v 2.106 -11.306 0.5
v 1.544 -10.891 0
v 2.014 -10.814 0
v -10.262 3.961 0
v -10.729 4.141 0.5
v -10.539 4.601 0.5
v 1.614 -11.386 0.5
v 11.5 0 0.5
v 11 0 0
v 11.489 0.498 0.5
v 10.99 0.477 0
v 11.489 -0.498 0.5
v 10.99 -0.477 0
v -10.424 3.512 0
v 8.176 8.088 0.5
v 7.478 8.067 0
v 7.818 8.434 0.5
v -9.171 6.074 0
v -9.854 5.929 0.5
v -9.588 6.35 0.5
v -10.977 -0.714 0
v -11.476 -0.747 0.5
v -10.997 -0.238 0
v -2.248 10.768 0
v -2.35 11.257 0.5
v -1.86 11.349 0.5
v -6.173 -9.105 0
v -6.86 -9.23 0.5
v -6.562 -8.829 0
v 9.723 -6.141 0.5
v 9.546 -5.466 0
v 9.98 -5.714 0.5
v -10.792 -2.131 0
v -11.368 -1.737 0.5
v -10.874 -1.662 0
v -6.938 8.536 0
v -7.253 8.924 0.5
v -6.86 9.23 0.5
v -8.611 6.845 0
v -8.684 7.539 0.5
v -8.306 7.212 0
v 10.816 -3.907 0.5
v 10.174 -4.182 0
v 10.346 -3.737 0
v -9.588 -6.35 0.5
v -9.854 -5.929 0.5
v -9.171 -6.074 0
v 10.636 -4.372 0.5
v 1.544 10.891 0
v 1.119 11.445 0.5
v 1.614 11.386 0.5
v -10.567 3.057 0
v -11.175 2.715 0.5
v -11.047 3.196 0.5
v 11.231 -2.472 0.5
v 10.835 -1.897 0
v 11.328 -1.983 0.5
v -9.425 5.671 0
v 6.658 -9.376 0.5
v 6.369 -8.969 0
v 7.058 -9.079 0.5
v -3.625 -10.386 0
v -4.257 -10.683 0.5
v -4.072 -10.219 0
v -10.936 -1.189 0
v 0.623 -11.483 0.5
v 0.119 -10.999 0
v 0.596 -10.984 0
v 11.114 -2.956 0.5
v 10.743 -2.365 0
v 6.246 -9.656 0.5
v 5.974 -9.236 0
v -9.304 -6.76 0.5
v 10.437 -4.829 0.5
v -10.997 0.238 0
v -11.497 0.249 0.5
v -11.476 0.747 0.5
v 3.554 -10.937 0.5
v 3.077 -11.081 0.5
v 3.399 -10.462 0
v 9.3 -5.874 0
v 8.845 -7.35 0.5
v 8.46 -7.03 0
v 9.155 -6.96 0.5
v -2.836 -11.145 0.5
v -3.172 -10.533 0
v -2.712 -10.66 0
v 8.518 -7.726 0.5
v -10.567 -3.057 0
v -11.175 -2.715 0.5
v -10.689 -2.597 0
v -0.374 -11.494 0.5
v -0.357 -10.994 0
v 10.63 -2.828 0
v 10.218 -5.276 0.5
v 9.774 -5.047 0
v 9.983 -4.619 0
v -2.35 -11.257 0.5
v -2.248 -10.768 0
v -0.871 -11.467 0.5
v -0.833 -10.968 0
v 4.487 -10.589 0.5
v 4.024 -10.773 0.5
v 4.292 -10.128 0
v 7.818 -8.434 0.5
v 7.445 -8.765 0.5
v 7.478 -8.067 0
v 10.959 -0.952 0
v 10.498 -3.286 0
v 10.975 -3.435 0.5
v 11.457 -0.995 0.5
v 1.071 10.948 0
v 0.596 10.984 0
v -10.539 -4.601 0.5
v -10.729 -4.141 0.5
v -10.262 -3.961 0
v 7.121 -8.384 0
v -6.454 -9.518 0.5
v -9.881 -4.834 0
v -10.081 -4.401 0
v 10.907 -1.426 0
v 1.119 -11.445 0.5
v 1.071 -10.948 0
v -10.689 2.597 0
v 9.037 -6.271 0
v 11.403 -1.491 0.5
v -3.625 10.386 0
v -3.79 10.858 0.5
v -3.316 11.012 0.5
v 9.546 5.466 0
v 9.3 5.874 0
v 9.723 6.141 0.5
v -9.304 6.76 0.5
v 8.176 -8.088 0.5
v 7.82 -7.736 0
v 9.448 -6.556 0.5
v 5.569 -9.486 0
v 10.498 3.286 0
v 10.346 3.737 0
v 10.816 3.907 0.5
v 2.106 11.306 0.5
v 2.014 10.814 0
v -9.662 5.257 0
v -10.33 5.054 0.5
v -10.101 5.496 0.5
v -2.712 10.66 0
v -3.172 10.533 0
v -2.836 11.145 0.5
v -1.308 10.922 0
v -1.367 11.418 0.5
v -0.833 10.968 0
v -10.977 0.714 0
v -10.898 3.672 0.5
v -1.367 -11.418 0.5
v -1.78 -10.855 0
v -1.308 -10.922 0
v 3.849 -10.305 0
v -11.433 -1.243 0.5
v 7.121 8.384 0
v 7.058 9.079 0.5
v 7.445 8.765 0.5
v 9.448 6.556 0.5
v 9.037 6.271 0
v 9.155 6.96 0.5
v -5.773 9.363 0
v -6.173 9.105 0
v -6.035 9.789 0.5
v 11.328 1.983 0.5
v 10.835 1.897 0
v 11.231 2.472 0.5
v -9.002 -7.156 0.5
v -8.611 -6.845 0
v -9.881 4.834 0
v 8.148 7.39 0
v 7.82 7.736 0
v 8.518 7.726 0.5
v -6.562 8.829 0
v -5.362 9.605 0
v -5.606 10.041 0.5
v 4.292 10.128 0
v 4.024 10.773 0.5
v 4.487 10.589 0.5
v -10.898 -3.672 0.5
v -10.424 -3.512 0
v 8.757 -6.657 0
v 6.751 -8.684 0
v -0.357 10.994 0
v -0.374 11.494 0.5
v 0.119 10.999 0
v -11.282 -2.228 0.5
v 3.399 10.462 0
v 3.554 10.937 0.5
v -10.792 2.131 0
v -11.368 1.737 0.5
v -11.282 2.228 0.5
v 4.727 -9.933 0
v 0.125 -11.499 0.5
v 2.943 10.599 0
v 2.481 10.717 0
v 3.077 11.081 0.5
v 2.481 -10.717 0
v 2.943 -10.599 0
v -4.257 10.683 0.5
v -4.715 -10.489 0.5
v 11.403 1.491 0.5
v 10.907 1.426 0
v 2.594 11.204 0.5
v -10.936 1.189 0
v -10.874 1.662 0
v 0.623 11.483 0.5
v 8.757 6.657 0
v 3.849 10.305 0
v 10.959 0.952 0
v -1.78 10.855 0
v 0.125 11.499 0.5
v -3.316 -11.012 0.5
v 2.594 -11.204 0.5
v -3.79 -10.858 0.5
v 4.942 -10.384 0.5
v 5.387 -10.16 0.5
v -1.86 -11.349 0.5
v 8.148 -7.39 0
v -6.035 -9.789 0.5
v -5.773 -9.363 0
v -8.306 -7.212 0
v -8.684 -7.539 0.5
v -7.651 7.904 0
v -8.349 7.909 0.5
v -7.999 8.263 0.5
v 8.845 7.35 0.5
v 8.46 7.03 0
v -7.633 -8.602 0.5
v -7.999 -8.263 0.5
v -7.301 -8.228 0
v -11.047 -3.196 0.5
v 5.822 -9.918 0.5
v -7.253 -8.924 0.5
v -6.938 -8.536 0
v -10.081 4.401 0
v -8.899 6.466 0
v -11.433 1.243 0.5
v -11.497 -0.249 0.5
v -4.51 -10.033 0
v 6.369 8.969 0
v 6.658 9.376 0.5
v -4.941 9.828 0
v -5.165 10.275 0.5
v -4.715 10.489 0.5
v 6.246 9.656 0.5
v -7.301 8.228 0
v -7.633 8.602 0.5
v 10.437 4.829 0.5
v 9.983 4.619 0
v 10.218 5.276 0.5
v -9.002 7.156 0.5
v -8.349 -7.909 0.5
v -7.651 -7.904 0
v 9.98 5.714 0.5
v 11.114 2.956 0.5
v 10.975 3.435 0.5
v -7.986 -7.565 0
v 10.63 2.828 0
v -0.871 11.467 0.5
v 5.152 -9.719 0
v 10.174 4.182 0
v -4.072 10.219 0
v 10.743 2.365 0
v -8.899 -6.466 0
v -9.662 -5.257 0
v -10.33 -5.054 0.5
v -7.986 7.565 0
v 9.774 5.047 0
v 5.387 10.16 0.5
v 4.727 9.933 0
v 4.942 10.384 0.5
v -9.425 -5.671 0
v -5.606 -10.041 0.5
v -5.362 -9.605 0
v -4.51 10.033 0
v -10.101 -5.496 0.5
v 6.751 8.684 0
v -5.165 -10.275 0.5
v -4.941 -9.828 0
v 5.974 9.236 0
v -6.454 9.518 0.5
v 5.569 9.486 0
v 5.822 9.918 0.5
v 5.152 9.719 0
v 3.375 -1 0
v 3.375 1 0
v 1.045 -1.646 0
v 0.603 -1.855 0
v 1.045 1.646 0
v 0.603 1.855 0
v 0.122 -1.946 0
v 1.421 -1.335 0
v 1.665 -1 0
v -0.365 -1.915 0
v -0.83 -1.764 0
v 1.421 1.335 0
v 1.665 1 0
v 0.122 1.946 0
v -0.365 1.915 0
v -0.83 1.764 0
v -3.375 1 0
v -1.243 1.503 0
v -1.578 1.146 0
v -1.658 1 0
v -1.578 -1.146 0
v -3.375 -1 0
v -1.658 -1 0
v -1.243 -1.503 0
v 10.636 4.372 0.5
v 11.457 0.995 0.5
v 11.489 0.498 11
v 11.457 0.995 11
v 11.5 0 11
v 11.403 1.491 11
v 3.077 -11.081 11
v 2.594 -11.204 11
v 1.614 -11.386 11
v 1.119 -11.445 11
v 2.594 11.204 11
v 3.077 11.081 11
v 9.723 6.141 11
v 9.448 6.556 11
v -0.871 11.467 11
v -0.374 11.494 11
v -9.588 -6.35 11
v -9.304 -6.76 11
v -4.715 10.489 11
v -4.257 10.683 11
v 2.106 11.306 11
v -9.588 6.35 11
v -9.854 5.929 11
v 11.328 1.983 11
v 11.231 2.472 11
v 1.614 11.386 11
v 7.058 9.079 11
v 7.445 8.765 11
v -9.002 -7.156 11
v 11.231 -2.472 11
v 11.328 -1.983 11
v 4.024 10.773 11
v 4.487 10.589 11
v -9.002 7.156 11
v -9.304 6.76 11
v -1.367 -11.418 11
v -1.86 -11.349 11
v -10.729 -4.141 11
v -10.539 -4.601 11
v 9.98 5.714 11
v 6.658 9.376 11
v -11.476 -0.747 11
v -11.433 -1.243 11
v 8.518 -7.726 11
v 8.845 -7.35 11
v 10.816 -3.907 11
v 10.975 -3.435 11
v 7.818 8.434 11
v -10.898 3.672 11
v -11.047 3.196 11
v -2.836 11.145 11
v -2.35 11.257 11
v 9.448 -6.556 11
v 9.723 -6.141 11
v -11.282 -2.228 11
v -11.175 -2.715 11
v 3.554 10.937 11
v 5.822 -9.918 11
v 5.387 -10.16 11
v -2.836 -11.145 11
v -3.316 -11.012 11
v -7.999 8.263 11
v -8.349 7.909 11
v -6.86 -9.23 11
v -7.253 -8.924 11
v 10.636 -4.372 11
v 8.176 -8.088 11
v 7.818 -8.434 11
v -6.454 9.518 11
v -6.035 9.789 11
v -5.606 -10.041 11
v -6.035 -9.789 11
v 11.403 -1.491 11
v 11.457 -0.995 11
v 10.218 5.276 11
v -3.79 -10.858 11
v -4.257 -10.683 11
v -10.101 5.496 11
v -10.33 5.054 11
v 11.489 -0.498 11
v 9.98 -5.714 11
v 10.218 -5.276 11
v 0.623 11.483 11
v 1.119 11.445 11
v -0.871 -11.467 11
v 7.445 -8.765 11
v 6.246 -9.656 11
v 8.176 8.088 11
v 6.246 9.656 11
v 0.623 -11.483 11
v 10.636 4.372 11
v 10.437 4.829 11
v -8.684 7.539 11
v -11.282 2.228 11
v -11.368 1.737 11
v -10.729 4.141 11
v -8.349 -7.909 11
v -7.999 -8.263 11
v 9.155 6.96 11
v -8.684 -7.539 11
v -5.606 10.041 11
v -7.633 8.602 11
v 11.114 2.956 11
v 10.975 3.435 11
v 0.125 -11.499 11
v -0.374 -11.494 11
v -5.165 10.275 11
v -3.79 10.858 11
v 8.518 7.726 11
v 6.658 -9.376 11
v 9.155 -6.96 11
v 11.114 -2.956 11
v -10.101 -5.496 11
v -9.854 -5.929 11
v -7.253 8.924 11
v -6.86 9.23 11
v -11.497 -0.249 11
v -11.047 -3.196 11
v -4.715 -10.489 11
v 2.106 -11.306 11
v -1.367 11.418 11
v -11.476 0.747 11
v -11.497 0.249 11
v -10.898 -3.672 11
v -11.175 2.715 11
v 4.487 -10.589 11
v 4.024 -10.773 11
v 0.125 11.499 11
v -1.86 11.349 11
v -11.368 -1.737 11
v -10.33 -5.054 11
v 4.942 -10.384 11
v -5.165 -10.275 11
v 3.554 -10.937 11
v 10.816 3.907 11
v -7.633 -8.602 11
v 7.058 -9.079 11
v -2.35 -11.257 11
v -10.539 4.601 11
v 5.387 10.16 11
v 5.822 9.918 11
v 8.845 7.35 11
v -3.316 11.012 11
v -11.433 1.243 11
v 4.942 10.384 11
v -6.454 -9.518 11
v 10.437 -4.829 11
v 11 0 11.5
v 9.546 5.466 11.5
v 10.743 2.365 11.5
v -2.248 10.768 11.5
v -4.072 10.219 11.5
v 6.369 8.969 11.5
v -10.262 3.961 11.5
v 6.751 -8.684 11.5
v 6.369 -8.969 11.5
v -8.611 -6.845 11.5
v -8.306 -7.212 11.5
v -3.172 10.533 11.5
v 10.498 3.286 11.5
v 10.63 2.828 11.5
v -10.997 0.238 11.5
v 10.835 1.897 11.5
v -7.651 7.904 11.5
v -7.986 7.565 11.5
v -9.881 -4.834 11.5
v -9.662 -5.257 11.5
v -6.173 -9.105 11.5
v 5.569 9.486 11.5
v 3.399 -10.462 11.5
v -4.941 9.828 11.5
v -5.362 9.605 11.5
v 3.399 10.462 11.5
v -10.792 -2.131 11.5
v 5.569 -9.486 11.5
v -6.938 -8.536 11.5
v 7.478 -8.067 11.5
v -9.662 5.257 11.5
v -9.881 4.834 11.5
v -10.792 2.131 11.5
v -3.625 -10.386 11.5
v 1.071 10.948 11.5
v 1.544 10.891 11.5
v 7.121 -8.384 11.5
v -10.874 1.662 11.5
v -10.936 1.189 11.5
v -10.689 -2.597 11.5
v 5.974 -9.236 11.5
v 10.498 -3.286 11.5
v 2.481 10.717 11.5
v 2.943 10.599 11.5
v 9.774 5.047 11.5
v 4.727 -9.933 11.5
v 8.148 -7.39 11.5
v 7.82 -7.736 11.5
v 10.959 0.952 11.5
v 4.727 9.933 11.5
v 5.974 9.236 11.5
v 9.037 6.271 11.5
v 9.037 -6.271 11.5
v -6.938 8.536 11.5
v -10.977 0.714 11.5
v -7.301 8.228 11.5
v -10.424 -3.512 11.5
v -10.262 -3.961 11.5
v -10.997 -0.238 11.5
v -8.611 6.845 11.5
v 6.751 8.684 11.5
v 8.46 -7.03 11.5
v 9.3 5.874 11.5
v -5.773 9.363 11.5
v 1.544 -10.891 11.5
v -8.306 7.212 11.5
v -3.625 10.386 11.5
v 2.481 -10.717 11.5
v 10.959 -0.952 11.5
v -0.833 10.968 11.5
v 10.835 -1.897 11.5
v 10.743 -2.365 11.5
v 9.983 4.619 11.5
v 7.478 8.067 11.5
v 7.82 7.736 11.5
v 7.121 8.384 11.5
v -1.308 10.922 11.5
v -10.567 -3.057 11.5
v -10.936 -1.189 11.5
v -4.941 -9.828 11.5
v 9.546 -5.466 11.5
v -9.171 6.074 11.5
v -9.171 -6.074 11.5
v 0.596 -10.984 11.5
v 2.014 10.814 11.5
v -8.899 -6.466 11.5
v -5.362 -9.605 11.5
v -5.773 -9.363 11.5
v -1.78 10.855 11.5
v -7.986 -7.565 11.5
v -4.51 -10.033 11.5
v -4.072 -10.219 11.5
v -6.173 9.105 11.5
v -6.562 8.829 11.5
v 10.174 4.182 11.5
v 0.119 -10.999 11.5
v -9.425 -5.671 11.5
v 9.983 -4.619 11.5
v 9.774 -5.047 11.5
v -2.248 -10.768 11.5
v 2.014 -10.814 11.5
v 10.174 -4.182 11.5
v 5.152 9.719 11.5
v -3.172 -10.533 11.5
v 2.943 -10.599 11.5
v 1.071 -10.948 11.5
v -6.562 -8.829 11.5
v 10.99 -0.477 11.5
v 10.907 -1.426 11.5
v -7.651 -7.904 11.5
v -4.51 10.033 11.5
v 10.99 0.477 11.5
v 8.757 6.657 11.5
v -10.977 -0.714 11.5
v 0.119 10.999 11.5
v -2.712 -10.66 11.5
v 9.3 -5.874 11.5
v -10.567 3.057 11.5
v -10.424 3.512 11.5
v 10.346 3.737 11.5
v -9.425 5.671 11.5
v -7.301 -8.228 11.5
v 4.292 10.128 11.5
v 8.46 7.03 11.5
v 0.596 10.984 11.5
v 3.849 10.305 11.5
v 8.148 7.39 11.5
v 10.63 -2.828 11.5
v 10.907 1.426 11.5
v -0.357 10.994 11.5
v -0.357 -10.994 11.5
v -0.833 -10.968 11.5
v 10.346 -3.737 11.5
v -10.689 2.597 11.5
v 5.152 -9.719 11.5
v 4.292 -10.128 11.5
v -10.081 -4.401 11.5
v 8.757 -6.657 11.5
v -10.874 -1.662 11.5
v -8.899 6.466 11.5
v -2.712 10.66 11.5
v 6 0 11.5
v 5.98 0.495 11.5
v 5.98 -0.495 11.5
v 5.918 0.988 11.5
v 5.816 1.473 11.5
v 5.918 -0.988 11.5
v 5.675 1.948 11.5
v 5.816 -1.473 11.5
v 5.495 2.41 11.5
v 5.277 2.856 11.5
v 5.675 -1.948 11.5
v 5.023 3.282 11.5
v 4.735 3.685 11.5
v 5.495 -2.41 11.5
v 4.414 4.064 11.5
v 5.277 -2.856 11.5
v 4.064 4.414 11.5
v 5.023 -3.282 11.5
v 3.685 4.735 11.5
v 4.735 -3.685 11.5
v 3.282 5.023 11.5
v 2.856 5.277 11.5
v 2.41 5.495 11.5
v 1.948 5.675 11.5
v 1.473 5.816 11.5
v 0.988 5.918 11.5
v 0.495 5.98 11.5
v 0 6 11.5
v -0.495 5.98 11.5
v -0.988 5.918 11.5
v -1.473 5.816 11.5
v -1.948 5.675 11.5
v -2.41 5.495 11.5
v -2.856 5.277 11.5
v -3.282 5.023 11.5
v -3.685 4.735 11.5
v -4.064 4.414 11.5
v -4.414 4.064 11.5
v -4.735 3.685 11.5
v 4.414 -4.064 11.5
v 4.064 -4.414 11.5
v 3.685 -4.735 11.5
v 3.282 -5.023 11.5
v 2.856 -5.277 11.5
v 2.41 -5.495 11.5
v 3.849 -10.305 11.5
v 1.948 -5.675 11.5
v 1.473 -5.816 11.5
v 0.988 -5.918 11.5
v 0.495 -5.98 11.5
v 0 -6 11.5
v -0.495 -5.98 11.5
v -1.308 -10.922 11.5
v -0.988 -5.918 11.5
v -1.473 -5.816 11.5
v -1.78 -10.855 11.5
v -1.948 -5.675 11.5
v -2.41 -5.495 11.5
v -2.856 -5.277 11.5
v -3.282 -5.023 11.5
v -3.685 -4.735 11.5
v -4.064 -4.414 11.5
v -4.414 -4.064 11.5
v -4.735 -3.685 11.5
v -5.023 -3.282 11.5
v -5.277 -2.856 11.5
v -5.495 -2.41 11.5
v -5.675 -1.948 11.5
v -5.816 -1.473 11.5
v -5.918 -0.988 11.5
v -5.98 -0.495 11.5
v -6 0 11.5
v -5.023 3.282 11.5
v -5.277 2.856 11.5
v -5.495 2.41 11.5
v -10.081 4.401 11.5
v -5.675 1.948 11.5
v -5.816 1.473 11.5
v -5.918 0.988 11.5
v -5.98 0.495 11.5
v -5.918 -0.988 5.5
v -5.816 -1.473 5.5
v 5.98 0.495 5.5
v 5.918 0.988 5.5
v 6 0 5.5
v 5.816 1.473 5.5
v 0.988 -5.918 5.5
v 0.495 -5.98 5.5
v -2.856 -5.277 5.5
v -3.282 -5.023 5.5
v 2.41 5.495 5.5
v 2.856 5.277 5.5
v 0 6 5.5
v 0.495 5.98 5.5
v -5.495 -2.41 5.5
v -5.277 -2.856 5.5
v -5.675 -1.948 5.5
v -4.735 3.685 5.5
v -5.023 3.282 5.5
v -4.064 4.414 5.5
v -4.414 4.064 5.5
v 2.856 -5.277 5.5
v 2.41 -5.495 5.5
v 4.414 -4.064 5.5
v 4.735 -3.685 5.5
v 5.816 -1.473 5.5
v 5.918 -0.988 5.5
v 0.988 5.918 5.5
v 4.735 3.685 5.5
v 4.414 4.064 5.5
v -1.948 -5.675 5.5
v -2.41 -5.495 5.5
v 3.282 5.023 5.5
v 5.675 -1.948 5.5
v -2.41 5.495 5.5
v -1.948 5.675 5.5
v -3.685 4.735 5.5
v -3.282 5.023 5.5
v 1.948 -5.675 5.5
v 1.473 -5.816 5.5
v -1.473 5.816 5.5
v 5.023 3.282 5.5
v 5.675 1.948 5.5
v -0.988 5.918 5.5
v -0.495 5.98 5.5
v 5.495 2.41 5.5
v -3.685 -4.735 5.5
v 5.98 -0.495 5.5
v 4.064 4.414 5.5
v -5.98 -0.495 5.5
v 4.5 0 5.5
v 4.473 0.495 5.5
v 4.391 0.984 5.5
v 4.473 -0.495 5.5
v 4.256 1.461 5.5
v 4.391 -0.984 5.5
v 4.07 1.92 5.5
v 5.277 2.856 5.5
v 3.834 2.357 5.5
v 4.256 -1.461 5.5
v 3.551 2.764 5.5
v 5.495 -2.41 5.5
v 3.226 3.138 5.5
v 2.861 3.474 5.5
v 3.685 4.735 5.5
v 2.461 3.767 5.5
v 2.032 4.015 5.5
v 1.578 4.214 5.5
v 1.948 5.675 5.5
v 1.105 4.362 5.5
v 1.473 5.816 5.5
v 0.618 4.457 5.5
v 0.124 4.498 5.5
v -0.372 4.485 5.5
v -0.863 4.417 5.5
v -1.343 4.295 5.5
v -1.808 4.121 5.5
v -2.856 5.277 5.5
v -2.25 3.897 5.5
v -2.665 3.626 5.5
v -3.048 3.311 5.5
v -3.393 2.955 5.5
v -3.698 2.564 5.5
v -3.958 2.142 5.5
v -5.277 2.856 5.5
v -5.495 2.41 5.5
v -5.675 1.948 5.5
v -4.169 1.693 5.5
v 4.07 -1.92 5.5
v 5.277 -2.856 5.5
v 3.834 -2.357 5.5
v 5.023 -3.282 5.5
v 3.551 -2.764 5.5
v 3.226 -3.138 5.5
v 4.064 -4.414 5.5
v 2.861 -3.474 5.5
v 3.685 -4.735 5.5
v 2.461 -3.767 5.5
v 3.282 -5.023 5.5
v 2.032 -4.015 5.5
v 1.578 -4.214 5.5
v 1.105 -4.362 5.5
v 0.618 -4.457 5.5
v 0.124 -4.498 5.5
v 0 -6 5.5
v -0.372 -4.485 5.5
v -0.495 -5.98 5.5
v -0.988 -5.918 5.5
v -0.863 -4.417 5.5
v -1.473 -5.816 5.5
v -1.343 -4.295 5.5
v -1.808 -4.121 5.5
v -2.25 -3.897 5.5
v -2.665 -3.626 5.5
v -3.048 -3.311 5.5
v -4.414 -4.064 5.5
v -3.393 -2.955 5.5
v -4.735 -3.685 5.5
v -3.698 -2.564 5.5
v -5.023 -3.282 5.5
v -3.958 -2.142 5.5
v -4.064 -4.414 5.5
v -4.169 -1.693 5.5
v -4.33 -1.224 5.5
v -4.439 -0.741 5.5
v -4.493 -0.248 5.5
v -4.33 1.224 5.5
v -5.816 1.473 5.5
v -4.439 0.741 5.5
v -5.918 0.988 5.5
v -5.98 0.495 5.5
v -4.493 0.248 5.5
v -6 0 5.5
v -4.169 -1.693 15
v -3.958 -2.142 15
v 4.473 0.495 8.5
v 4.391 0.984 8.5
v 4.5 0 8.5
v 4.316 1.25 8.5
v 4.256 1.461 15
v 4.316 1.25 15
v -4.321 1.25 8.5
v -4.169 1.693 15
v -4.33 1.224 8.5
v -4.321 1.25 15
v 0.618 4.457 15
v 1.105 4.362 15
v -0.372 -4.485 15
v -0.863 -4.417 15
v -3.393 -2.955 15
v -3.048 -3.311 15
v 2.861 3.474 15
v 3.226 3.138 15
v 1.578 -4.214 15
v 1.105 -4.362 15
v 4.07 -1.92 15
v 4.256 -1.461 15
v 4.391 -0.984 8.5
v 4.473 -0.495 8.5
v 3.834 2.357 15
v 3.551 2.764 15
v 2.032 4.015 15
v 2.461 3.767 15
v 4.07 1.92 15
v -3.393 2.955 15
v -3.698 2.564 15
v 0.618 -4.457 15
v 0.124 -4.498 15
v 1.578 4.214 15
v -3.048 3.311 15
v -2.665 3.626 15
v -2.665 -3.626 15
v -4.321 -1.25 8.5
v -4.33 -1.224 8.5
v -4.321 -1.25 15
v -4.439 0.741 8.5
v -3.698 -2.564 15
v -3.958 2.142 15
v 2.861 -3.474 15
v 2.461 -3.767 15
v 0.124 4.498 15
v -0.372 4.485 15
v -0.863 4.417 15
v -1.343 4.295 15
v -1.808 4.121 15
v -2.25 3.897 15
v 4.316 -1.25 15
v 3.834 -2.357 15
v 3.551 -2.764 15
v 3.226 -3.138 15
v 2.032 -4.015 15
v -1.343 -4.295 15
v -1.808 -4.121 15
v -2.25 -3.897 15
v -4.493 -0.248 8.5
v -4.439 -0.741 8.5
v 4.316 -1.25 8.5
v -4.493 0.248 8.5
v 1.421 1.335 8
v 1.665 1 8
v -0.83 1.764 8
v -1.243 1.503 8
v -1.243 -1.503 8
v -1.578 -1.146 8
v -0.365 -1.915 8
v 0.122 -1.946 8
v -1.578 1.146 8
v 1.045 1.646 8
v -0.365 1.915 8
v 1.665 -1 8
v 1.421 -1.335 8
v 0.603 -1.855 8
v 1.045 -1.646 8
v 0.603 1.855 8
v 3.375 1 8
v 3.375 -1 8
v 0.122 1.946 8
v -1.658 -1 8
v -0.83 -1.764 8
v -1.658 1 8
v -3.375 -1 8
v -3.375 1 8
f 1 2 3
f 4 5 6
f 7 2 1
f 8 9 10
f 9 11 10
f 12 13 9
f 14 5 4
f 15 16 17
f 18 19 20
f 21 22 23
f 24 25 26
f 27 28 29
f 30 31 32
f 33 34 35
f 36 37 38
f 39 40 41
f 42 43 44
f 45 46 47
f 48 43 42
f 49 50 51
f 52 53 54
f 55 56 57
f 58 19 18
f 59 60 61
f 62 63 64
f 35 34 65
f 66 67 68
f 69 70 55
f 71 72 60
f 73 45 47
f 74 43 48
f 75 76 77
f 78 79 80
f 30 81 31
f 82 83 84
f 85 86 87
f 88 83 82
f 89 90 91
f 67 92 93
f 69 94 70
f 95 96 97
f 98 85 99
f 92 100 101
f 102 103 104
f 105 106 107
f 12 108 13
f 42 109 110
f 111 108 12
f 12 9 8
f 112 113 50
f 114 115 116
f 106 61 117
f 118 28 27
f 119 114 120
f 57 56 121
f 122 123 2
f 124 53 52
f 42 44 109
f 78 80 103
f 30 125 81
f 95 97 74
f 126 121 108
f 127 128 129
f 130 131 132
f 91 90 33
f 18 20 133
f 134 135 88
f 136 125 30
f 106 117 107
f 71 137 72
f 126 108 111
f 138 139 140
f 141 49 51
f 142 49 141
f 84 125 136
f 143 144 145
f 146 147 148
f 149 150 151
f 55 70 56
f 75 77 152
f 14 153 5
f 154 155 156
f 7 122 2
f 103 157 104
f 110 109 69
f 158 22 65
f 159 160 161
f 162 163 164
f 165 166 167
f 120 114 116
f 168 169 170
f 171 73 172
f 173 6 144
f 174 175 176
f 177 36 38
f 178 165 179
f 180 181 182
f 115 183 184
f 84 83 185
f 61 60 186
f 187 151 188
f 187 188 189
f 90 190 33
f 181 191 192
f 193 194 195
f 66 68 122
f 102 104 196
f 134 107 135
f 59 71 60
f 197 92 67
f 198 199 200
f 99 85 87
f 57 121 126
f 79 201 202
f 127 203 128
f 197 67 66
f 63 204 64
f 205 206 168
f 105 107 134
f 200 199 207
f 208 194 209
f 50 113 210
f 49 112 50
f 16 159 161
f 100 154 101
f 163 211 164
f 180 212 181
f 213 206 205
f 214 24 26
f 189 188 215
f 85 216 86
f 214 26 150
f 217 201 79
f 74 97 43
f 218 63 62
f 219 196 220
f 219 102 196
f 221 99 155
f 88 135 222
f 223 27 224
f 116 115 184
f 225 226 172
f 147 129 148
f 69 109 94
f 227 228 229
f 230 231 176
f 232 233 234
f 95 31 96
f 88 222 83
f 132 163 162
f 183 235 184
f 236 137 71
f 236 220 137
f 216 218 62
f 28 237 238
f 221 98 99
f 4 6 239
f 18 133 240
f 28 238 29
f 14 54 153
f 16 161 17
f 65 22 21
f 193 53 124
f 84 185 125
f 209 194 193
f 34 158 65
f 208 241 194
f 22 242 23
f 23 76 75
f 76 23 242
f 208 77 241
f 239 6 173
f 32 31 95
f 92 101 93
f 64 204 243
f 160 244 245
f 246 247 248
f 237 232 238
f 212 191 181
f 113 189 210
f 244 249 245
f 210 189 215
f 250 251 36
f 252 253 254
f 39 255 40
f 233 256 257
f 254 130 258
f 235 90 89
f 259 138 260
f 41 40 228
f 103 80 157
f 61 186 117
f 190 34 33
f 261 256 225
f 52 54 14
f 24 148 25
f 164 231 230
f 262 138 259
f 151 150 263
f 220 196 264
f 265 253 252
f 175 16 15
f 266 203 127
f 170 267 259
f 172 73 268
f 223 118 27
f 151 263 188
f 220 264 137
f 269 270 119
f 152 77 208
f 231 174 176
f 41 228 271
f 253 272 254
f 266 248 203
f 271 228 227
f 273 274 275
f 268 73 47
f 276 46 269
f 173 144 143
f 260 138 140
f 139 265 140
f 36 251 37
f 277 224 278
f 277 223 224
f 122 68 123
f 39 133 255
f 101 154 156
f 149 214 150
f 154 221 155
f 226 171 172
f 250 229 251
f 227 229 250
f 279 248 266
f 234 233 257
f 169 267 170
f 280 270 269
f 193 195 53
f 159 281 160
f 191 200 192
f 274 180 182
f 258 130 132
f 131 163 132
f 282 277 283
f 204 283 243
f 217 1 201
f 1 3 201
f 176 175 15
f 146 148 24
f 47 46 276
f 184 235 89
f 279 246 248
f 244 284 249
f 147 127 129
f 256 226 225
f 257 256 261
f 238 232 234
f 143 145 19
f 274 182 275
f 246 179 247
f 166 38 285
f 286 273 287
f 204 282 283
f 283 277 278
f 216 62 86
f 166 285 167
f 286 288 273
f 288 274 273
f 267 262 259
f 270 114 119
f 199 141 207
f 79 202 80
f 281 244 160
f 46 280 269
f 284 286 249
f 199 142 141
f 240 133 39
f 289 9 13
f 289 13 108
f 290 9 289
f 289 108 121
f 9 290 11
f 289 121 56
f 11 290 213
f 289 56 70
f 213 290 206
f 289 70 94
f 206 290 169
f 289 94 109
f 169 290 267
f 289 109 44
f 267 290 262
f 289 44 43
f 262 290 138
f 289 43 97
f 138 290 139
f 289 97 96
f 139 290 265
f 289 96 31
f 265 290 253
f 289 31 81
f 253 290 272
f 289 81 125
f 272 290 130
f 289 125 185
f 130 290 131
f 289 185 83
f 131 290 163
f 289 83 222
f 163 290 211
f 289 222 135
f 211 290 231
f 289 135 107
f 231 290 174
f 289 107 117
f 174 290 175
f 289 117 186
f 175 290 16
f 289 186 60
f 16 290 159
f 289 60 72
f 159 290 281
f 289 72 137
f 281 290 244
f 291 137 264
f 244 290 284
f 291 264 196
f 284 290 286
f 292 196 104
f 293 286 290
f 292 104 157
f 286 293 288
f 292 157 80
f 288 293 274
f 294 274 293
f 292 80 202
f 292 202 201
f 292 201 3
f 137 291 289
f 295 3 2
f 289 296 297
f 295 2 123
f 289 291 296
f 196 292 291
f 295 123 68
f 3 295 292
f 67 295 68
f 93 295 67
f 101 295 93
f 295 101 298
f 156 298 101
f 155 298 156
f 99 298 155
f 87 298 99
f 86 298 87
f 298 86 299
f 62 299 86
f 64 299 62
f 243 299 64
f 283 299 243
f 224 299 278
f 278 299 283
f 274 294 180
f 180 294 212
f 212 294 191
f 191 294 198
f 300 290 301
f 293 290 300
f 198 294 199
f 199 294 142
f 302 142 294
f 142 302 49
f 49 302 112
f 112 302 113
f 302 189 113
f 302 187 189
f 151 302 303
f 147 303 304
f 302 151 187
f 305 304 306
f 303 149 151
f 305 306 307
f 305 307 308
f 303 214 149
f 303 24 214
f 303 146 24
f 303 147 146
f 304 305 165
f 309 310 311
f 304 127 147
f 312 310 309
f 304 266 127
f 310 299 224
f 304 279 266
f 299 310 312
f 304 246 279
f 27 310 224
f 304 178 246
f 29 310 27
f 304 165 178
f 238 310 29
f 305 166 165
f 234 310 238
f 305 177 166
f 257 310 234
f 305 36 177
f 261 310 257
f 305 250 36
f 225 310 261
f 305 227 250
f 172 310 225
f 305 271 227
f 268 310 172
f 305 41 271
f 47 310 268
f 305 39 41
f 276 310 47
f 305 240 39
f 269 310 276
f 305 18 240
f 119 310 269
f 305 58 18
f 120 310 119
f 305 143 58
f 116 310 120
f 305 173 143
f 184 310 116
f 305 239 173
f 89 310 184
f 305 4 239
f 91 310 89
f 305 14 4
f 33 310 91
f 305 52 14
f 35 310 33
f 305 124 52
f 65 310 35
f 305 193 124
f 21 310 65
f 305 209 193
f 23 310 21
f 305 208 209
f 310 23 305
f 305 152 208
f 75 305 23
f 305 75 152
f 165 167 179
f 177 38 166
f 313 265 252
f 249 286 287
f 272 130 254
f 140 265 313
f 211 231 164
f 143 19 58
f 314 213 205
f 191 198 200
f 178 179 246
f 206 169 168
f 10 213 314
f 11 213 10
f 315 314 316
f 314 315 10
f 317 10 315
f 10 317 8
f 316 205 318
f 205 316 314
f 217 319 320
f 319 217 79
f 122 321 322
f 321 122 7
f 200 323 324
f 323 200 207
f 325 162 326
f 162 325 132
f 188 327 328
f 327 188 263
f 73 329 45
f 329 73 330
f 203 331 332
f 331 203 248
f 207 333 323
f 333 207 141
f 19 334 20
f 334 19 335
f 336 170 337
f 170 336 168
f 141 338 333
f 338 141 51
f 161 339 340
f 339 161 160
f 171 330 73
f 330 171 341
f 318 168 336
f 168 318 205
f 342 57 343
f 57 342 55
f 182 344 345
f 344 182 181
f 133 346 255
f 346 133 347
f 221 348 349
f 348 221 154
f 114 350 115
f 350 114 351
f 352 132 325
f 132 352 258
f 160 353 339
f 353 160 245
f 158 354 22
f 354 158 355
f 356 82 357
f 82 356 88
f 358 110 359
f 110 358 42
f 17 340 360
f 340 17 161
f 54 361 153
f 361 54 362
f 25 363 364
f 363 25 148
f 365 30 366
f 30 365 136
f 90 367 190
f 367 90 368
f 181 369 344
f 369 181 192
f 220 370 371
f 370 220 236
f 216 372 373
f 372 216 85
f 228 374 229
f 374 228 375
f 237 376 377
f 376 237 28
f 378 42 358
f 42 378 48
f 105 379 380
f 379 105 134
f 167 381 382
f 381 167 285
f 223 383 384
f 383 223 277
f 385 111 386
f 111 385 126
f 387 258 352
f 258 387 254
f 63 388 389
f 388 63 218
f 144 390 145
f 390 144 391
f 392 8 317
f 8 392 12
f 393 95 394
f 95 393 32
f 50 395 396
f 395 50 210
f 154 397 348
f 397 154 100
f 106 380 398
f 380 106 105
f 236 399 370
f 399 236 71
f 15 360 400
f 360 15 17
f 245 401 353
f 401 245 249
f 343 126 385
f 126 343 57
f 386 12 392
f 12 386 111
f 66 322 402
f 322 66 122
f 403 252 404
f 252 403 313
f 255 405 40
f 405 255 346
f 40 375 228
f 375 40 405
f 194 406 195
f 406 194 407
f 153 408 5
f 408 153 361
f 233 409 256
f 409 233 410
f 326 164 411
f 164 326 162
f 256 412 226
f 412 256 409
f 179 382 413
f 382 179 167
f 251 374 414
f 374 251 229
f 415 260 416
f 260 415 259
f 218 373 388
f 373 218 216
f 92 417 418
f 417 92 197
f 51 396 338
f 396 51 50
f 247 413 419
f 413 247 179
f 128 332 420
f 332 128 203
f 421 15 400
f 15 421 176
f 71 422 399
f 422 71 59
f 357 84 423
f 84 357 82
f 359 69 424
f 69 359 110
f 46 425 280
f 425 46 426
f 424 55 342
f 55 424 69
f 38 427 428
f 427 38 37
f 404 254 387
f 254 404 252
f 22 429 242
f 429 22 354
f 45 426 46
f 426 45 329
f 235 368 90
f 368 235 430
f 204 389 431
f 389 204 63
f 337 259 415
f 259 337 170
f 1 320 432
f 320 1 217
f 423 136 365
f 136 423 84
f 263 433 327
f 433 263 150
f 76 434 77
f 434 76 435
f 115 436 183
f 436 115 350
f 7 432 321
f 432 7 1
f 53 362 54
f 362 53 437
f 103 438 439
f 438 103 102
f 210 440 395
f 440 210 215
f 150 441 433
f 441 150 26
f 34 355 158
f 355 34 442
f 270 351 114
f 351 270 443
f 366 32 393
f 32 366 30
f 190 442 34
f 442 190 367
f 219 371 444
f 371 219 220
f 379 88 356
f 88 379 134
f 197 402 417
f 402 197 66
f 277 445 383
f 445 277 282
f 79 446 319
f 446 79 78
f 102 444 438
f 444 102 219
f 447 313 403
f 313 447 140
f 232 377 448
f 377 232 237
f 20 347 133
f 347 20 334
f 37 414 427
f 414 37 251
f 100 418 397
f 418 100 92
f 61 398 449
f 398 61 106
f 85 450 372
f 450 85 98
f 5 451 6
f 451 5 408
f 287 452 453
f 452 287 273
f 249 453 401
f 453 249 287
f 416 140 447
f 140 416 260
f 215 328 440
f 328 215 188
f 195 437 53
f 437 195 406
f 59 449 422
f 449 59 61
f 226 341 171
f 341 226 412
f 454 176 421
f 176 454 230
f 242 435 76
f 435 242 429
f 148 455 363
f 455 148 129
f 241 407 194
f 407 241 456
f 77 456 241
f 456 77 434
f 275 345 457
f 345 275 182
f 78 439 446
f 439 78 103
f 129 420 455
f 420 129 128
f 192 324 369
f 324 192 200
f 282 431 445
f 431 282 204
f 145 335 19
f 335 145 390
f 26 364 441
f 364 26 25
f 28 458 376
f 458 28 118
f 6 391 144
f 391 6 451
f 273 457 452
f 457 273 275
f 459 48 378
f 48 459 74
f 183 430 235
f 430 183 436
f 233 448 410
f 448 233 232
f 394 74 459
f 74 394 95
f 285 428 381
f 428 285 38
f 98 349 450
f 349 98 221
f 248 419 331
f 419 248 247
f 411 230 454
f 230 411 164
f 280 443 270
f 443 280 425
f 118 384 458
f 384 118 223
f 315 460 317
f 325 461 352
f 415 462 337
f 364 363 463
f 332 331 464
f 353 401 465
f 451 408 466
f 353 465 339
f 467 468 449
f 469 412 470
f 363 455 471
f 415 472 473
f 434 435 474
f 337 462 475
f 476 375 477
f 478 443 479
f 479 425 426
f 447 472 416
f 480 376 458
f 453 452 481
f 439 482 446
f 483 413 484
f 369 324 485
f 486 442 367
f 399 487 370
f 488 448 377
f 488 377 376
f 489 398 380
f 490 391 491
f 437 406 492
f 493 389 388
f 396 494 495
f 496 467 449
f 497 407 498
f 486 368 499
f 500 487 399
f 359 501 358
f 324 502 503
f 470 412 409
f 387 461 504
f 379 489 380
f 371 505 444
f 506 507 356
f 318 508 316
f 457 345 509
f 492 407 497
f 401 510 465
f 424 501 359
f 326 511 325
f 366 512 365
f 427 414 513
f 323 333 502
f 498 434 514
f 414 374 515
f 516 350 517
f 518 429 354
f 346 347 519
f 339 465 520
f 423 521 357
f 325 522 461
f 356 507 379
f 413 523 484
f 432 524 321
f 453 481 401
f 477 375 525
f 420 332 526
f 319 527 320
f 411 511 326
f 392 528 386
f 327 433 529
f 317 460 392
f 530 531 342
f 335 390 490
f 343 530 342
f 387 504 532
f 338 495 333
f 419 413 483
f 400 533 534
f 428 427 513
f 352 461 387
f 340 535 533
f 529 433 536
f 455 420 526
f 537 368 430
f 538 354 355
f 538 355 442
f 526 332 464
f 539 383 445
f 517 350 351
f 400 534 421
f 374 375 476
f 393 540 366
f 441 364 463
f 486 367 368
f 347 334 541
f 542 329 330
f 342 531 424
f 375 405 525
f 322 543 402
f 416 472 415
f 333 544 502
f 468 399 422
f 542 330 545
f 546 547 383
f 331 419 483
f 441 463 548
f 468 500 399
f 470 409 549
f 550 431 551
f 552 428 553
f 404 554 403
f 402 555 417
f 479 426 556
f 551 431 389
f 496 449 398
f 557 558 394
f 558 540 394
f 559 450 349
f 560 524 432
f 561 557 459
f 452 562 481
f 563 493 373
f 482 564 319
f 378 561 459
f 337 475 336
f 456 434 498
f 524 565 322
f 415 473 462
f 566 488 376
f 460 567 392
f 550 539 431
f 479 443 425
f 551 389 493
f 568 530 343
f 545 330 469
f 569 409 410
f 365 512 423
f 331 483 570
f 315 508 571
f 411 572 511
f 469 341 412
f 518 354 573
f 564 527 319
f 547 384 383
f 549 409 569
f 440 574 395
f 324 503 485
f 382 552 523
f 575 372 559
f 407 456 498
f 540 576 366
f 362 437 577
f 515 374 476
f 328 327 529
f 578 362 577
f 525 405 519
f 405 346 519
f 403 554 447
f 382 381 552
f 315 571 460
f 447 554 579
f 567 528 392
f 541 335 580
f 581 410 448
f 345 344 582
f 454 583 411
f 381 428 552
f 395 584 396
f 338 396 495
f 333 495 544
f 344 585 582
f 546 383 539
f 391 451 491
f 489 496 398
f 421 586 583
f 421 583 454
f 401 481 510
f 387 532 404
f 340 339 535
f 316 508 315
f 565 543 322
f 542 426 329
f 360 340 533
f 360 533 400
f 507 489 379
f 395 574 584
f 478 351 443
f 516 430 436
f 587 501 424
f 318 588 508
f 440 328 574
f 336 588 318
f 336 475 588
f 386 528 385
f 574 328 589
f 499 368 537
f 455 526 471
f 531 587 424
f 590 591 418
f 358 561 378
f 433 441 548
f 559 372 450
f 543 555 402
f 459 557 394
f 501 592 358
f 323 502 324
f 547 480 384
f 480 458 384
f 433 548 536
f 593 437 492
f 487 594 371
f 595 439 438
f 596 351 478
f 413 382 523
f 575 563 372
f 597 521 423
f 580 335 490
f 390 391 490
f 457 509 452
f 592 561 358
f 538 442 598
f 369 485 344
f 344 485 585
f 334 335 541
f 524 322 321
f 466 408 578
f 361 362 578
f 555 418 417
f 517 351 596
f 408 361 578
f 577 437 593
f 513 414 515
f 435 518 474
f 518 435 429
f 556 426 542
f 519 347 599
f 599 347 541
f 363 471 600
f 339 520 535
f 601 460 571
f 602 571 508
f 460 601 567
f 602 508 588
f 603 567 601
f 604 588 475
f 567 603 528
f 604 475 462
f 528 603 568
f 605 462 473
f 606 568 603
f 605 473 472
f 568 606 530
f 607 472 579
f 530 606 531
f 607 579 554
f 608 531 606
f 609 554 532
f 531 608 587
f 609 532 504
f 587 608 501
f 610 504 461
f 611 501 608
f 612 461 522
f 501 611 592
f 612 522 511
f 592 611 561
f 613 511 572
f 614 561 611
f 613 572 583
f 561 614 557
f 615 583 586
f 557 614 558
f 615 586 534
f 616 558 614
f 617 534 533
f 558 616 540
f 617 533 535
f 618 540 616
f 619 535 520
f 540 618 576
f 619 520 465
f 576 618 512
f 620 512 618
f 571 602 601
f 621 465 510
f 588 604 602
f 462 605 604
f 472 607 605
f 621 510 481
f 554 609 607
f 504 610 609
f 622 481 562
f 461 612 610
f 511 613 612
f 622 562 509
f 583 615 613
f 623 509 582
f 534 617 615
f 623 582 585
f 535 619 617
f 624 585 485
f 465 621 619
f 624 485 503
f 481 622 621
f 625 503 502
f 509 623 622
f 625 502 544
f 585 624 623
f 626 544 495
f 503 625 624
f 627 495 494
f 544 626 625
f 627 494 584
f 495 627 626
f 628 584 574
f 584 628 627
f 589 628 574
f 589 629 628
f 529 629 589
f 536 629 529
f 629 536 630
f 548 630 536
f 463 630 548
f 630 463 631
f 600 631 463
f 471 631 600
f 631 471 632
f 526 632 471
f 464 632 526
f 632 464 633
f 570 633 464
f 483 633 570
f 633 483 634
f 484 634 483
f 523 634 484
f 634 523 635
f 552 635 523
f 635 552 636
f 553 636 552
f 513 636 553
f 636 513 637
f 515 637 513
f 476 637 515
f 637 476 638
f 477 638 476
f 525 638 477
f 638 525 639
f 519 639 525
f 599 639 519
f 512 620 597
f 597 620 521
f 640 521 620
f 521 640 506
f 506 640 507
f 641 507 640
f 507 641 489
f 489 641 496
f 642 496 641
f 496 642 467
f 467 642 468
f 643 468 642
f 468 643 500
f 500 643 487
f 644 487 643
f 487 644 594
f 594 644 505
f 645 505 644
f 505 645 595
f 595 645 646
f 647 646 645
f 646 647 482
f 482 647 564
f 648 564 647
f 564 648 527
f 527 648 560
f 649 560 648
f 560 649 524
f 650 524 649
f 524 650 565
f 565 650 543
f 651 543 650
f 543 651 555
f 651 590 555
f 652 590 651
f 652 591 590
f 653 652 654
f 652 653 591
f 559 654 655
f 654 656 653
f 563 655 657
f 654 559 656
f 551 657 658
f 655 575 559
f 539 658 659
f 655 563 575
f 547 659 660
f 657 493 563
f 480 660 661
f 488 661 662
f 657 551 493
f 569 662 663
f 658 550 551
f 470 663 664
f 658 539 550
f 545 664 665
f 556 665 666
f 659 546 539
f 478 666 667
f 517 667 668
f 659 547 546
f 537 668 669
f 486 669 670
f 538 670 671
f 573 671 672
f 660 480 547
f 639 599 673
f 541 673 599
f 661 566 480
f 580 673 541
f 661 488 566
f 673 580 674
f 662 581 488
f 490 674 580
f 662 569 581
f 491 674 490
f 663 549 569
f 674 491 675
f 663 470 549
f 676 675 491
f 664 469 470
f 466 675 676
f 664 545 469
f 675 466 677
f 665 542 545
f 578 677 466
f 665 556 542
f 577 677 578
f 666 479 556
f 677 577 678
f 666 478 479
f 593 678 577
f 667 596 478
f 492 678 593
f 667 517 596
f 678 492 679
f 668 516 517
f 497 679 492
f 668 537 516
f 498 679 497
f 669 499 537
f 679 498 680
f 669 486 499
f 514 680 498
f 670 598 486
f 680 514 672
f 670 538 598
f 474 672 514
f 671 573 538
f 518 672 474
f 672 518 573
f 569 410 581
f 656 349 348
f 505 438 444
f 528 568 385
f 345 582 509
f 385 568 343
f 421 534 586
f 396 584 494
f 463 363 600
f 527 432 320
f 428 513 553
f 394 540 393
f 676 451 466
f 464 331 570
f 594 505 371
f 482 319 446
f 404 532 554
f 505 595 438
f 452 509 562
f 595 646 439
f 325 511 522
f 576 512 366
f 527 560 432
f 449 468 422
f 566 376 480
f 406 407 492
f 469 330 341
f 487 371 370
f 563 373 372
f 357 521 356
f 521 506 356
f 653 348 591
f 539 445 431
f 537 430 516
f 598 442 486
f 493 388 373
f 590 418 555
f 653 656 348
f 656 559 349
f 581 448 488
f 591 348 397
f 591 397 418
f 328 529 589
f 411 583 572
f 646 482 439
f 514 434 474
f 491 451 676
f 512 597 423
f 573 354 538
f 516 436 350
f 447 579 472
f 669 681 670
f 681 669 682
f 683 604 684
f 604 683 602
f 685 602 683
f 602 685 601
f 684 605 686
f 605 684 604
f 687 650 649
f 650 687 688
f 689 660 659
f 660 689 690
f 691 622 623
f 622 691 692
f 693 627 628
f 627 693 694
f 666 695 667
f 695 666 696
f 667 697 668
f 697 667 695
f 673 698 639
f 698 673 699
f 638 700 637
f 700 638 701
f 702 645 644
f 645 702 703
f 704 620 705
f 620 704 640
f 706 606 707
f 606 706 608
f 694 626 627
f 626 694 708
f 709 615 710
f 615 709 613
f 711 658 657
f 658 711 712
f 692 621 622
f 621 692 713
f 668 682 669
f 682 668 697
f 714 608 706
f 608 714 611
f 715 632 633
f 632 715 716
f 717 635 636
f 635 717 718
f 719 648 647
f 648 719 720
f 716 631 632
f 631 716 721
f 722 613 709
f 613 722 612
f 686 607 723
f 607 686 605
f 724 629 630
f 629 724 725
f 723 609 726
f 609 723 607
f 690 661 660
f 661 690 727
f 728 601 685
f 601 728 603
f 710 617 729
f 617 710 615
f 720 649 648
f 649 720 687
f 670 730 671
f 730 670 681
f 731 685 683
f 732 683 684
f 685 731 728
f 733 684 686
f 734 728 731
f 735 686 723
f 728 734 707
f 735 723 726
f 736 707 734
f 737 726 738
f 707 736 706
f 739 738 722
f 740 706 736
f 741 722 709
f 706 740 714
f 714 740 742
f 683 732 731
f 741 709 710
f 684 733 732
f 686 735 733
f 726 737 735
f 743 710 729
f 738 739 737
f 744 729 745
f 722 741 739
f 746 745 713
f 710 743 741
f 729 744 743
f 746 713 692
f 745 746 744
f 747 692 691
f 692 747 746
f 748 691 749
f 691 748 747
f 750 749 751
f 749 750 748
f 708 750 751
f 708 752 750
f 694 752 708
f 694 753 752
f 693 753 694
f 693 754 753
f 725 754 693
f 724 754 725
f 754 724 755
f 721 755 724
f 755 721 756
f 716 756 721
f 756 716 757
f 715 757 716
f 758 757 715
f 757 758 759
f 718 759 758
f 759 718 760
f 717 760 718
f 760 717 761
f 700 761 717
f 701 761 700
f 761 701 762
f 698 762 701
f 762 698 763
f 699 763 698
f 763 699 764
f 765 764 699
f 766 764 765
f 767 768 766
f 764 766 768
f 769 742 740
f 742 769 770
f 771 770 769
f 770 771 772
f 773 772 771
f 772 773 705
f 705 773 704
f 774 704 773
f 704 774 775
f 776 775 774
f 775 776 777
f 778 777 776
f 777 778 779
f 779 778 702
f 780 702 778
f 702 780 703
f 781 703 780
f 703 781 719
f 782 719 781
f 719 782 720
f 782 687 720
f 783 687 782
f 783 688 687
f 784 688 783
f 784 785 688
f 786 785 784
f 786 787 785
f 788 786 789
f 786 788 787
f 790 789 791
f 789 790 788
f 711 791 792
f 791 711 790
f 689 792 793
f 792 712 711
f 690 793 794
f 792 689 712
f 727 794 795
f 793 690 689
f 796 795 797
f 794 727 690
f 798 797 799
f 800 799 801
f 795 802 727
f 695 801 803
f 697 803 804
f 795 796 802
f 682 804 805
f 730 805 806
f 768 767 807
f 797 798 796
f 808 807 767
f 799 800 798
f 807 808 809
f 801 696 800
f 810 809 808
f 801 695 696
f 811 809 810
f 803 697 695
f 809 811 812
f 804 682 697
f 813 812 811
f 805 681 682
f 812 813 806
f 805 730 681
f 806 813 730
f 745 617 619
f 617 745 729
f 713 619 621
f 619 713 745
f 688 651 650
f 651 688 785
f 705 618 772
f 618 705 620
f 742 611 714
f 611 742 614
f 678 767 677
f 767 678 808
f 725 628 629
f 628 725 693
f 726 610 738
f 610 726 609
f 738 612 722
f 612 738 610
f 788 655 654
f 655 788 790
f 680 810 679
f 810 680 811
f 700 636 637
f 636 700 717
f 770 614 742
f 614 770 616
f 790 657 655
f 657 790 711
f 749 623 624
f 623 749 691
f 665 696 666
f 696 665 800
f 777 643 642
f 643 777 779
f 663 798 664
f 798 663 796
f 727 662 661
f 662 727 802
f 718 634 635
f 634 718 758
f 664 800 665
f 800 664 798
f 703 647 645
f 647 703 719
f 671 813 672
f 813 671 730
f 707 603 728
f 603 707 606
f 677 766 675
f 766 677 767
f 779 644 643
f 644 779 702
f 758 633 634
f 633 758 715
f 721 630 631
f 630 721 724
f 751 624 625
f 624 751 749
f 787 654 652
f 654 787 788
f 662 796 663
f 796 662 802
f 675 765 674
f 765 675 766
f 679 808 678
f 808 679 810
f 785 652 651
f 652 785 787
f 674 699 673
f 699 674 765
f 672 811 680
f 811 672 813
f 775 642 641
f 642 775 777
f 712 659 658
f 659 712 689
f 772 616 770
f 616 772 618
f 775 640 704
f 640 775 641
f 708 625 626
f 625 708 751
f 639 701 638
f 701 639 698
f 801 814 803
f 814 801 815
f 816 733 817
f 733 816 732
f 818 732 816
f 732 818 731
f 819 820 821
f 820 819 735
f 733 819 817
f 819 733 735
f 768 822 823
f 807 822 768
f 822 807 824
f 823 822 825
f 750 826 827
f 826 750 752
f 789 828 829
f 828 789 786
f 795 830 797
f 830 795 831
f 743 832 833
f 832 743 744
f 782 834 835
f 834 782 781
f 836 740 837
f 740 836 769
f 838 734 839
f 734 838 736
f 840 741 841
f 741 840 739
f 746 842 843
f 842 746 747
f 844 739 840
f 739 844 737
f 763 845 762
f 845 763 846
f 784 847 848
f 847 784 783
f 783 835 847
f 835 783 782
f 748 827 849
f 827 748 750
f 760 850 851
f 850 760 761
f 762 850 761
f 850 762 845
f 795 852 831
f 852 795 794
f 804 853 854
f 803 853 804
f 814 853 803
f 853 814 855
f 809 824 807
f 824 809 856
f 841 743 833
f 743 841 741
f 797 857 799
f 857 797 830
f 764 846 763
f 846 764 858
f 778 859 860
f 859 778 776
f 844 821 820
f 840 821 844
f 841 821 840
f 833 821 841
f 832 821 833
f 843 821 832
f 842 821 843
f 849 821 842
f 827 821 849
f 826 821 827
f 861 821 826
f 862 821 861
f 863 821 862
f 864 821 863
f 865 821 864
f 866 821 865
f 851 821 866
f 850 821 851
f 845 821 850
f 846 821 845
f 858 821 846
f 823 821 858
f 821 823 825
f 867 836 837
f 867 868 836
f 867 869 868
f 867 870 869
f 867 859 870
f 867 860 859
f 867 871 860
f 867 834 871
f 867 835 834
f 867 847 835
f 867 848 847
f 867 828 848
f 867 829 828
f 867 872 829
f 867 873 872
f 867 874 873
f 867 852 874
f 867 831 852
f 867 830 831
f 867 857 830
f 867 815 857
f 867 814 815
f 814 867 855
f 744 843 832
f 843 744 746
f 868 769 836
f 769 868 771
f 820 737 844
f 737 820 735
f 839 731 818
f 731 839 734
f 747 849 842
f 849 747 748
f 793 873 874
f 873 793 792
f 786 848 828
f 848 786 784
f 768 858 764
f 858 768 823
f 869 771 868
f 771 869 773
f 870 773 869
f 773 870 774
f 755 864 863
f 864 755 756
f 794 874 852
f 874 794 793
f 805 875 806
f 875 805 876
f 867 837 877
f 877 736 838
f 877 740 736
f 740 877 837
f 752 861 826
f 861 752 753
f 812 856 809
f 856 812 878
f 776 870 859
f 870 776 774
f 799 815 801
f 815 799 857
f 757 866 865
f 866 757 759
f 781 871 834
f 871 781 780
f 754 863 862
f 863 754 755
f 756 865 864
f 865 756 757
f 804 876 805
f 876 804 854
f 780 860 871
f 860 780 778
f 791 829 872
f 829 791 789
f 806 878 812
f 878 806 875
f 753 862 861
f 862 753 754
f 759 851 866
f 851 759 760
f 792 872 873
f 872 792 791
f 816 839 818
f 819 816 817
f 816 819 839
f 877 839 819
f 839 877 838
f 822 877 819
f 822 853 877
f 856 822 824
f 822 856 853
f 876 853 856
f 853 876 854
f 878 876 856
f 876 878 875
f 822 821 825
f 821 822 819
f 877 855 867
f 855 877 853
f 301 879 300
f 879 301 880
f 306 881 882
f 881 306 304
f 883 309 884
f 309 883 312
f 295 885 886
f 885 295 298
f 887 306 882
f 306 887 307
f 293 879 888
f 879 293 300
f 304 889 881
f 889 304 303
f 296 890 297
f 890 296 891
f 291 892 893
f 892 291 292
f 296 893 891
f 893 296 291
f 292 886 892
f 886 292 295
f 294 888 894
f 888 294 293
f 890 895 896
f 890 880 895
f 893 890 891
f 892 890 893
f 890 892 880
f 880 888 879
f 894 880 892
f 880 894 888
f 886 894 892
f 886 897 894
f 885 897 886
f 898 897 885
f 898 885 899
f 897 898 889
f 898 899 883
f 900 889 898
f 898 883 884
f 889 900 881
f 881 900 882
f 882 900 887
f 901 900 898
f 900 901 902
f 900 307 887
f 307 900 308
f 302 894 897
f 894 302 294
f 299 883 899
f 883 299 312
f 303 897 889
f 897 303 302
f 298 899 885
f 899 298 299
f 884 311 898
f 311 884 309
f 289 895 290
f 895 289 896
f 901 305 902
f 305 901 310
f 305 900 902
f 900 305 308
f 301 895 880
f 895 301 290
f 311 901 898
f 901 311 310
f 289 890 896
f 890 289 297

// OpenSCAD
od1=23/2 ; //baseouter diamter
h1=11.5 ; //base height
od2 = 9/2 ; //shaft diameter
h2= 15; //shaft height
dr=0.1;
x1 = 10 ;
y1 = 2.5 ;
z1= 6.5;
h3 = 6;
od3 = 12/2;
x2=6.75;
y2=2;

pind=3.9/2;
chamfer=0.5;
difference(){
difference()
{
   union(){ 
    difference()
       {
        union(){
           cylinder (chamfer,  od1-chamfer , od1 , false,$fa=1, $fs=0.5);   
            translate([0,0,chamfer]) cylinder (h1-2*chamfer,  od1 , od1 , false,$fa=1, $fs=0.5);
        translate([0,0,h1-chamfer]) cylinder (chamfer,  od1 , od1-chamfer , false,$fa=1, $fs=0.5);
        }
       translate([0,0,h1-h3]) cylinder (h3,  od3 , od3 , false,$fa=1, $fs=0.5);
        }
       
        cylinder (h2,  od2 , od2 , false,$fa=1, $fs=0.5);
   }
   
    translate ( [-x1/2 , -y1/2 ,h2-z1])  cube([x1,y1,z1]);

}
union(){
cylinder (8,pind,pind, false,$fa=1, $fs=0.5);
translate ( [-x2/2 , -y2/2 ,0]) cube([x2,y2,8]);
    }
}
